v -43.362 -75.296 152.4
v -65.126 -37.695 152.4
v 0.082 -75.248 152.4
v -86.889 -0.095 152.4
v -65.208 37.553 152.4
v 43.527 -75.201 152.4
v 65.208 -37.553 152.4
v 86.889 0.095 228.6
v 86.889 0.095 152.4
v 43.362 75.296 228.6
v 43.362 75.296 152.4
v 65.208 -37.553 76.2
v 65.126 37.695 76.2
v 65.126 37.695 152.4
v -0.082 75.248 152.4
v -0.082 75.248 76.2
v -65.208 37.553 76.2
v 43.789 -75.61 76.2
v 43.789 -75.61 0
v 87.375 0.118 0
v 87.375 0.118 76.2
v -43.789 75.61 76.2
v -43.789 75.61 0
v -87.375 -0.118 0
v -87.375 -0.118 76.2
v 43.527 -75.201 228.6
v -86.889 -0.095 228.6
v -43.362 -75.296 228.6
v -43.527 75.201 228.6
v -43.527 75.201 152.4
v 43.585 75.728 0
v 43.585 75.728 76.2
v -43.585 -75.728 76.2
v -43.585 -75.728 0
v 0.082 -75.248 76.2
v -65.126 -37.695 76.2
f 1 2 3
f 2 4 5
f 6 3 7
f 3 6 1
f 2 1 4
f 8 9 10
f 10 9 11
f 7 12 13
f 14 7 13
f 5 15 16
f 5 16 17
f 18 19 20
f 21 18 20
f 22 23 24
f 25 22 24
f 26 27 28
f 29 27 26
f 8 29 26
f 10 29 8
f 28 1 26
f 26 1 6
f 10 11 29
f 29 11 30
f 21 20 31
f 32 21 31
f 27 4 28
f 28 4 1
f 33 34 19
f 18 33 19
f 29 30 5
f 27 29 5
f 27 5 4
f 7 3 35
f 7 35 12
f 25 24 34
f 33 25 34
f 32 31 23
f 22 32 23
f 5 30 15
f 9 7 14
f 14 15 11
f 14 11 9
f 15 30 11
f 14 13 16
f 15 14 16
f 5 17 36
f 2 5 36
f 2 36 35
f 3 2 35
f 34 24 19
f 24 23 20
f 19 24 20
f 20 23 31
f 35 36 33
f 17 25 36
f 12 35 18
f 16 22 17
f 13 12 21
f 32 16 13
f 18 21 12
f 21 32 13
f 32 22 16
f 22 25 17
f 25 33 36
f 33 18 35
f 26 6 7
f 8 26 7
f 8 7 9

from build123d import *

# Parameters (mm, degrees)
F1_DEPTH = 76.2
F3_DEPTH = 76.2
F5_DEPTH = 76.2


with BuildPart() as f1:
    # F0 (on Top) → F1 (new body)
    with BuildSketch(Plane.XY):
        Polygon((43.789267, -75.609836), (87.374672, 0.1177), (43.585405, 75.727536), (-43.789267, 75.609836), (-87.374672, -0.1177), (-43.585405, -75.727536), align=None)
    extrude(amount=F1_DEPTH)

    # F2 (on face) → F3 (join)
    with BuildSketch(Plane.XY.offset(76.2)):
        Polygon((-0.082408, 75.248235), (-65.208088, 37.55275), (-65.125679, -37.695485), (0.082408, -75.248235), (65.208088, -37.55275), (65.125679, 37.695485), align=None)
    extrude(amount=F3_DEPTH)

    # F4 (on face) → F5 (join)
    with BuildSketch(Plane.XY.offset(152.4)):
        Polygon((43.526997, -75.200657), (86.889178, 0.095157), (43.362181, 75.295814), (-43.526997, 75.200657), (-86.889178, -0.095157), (-43.362181, -75.295814), align=None)
    extrude(amount=F5_DEPTH)


solid = f1.part
